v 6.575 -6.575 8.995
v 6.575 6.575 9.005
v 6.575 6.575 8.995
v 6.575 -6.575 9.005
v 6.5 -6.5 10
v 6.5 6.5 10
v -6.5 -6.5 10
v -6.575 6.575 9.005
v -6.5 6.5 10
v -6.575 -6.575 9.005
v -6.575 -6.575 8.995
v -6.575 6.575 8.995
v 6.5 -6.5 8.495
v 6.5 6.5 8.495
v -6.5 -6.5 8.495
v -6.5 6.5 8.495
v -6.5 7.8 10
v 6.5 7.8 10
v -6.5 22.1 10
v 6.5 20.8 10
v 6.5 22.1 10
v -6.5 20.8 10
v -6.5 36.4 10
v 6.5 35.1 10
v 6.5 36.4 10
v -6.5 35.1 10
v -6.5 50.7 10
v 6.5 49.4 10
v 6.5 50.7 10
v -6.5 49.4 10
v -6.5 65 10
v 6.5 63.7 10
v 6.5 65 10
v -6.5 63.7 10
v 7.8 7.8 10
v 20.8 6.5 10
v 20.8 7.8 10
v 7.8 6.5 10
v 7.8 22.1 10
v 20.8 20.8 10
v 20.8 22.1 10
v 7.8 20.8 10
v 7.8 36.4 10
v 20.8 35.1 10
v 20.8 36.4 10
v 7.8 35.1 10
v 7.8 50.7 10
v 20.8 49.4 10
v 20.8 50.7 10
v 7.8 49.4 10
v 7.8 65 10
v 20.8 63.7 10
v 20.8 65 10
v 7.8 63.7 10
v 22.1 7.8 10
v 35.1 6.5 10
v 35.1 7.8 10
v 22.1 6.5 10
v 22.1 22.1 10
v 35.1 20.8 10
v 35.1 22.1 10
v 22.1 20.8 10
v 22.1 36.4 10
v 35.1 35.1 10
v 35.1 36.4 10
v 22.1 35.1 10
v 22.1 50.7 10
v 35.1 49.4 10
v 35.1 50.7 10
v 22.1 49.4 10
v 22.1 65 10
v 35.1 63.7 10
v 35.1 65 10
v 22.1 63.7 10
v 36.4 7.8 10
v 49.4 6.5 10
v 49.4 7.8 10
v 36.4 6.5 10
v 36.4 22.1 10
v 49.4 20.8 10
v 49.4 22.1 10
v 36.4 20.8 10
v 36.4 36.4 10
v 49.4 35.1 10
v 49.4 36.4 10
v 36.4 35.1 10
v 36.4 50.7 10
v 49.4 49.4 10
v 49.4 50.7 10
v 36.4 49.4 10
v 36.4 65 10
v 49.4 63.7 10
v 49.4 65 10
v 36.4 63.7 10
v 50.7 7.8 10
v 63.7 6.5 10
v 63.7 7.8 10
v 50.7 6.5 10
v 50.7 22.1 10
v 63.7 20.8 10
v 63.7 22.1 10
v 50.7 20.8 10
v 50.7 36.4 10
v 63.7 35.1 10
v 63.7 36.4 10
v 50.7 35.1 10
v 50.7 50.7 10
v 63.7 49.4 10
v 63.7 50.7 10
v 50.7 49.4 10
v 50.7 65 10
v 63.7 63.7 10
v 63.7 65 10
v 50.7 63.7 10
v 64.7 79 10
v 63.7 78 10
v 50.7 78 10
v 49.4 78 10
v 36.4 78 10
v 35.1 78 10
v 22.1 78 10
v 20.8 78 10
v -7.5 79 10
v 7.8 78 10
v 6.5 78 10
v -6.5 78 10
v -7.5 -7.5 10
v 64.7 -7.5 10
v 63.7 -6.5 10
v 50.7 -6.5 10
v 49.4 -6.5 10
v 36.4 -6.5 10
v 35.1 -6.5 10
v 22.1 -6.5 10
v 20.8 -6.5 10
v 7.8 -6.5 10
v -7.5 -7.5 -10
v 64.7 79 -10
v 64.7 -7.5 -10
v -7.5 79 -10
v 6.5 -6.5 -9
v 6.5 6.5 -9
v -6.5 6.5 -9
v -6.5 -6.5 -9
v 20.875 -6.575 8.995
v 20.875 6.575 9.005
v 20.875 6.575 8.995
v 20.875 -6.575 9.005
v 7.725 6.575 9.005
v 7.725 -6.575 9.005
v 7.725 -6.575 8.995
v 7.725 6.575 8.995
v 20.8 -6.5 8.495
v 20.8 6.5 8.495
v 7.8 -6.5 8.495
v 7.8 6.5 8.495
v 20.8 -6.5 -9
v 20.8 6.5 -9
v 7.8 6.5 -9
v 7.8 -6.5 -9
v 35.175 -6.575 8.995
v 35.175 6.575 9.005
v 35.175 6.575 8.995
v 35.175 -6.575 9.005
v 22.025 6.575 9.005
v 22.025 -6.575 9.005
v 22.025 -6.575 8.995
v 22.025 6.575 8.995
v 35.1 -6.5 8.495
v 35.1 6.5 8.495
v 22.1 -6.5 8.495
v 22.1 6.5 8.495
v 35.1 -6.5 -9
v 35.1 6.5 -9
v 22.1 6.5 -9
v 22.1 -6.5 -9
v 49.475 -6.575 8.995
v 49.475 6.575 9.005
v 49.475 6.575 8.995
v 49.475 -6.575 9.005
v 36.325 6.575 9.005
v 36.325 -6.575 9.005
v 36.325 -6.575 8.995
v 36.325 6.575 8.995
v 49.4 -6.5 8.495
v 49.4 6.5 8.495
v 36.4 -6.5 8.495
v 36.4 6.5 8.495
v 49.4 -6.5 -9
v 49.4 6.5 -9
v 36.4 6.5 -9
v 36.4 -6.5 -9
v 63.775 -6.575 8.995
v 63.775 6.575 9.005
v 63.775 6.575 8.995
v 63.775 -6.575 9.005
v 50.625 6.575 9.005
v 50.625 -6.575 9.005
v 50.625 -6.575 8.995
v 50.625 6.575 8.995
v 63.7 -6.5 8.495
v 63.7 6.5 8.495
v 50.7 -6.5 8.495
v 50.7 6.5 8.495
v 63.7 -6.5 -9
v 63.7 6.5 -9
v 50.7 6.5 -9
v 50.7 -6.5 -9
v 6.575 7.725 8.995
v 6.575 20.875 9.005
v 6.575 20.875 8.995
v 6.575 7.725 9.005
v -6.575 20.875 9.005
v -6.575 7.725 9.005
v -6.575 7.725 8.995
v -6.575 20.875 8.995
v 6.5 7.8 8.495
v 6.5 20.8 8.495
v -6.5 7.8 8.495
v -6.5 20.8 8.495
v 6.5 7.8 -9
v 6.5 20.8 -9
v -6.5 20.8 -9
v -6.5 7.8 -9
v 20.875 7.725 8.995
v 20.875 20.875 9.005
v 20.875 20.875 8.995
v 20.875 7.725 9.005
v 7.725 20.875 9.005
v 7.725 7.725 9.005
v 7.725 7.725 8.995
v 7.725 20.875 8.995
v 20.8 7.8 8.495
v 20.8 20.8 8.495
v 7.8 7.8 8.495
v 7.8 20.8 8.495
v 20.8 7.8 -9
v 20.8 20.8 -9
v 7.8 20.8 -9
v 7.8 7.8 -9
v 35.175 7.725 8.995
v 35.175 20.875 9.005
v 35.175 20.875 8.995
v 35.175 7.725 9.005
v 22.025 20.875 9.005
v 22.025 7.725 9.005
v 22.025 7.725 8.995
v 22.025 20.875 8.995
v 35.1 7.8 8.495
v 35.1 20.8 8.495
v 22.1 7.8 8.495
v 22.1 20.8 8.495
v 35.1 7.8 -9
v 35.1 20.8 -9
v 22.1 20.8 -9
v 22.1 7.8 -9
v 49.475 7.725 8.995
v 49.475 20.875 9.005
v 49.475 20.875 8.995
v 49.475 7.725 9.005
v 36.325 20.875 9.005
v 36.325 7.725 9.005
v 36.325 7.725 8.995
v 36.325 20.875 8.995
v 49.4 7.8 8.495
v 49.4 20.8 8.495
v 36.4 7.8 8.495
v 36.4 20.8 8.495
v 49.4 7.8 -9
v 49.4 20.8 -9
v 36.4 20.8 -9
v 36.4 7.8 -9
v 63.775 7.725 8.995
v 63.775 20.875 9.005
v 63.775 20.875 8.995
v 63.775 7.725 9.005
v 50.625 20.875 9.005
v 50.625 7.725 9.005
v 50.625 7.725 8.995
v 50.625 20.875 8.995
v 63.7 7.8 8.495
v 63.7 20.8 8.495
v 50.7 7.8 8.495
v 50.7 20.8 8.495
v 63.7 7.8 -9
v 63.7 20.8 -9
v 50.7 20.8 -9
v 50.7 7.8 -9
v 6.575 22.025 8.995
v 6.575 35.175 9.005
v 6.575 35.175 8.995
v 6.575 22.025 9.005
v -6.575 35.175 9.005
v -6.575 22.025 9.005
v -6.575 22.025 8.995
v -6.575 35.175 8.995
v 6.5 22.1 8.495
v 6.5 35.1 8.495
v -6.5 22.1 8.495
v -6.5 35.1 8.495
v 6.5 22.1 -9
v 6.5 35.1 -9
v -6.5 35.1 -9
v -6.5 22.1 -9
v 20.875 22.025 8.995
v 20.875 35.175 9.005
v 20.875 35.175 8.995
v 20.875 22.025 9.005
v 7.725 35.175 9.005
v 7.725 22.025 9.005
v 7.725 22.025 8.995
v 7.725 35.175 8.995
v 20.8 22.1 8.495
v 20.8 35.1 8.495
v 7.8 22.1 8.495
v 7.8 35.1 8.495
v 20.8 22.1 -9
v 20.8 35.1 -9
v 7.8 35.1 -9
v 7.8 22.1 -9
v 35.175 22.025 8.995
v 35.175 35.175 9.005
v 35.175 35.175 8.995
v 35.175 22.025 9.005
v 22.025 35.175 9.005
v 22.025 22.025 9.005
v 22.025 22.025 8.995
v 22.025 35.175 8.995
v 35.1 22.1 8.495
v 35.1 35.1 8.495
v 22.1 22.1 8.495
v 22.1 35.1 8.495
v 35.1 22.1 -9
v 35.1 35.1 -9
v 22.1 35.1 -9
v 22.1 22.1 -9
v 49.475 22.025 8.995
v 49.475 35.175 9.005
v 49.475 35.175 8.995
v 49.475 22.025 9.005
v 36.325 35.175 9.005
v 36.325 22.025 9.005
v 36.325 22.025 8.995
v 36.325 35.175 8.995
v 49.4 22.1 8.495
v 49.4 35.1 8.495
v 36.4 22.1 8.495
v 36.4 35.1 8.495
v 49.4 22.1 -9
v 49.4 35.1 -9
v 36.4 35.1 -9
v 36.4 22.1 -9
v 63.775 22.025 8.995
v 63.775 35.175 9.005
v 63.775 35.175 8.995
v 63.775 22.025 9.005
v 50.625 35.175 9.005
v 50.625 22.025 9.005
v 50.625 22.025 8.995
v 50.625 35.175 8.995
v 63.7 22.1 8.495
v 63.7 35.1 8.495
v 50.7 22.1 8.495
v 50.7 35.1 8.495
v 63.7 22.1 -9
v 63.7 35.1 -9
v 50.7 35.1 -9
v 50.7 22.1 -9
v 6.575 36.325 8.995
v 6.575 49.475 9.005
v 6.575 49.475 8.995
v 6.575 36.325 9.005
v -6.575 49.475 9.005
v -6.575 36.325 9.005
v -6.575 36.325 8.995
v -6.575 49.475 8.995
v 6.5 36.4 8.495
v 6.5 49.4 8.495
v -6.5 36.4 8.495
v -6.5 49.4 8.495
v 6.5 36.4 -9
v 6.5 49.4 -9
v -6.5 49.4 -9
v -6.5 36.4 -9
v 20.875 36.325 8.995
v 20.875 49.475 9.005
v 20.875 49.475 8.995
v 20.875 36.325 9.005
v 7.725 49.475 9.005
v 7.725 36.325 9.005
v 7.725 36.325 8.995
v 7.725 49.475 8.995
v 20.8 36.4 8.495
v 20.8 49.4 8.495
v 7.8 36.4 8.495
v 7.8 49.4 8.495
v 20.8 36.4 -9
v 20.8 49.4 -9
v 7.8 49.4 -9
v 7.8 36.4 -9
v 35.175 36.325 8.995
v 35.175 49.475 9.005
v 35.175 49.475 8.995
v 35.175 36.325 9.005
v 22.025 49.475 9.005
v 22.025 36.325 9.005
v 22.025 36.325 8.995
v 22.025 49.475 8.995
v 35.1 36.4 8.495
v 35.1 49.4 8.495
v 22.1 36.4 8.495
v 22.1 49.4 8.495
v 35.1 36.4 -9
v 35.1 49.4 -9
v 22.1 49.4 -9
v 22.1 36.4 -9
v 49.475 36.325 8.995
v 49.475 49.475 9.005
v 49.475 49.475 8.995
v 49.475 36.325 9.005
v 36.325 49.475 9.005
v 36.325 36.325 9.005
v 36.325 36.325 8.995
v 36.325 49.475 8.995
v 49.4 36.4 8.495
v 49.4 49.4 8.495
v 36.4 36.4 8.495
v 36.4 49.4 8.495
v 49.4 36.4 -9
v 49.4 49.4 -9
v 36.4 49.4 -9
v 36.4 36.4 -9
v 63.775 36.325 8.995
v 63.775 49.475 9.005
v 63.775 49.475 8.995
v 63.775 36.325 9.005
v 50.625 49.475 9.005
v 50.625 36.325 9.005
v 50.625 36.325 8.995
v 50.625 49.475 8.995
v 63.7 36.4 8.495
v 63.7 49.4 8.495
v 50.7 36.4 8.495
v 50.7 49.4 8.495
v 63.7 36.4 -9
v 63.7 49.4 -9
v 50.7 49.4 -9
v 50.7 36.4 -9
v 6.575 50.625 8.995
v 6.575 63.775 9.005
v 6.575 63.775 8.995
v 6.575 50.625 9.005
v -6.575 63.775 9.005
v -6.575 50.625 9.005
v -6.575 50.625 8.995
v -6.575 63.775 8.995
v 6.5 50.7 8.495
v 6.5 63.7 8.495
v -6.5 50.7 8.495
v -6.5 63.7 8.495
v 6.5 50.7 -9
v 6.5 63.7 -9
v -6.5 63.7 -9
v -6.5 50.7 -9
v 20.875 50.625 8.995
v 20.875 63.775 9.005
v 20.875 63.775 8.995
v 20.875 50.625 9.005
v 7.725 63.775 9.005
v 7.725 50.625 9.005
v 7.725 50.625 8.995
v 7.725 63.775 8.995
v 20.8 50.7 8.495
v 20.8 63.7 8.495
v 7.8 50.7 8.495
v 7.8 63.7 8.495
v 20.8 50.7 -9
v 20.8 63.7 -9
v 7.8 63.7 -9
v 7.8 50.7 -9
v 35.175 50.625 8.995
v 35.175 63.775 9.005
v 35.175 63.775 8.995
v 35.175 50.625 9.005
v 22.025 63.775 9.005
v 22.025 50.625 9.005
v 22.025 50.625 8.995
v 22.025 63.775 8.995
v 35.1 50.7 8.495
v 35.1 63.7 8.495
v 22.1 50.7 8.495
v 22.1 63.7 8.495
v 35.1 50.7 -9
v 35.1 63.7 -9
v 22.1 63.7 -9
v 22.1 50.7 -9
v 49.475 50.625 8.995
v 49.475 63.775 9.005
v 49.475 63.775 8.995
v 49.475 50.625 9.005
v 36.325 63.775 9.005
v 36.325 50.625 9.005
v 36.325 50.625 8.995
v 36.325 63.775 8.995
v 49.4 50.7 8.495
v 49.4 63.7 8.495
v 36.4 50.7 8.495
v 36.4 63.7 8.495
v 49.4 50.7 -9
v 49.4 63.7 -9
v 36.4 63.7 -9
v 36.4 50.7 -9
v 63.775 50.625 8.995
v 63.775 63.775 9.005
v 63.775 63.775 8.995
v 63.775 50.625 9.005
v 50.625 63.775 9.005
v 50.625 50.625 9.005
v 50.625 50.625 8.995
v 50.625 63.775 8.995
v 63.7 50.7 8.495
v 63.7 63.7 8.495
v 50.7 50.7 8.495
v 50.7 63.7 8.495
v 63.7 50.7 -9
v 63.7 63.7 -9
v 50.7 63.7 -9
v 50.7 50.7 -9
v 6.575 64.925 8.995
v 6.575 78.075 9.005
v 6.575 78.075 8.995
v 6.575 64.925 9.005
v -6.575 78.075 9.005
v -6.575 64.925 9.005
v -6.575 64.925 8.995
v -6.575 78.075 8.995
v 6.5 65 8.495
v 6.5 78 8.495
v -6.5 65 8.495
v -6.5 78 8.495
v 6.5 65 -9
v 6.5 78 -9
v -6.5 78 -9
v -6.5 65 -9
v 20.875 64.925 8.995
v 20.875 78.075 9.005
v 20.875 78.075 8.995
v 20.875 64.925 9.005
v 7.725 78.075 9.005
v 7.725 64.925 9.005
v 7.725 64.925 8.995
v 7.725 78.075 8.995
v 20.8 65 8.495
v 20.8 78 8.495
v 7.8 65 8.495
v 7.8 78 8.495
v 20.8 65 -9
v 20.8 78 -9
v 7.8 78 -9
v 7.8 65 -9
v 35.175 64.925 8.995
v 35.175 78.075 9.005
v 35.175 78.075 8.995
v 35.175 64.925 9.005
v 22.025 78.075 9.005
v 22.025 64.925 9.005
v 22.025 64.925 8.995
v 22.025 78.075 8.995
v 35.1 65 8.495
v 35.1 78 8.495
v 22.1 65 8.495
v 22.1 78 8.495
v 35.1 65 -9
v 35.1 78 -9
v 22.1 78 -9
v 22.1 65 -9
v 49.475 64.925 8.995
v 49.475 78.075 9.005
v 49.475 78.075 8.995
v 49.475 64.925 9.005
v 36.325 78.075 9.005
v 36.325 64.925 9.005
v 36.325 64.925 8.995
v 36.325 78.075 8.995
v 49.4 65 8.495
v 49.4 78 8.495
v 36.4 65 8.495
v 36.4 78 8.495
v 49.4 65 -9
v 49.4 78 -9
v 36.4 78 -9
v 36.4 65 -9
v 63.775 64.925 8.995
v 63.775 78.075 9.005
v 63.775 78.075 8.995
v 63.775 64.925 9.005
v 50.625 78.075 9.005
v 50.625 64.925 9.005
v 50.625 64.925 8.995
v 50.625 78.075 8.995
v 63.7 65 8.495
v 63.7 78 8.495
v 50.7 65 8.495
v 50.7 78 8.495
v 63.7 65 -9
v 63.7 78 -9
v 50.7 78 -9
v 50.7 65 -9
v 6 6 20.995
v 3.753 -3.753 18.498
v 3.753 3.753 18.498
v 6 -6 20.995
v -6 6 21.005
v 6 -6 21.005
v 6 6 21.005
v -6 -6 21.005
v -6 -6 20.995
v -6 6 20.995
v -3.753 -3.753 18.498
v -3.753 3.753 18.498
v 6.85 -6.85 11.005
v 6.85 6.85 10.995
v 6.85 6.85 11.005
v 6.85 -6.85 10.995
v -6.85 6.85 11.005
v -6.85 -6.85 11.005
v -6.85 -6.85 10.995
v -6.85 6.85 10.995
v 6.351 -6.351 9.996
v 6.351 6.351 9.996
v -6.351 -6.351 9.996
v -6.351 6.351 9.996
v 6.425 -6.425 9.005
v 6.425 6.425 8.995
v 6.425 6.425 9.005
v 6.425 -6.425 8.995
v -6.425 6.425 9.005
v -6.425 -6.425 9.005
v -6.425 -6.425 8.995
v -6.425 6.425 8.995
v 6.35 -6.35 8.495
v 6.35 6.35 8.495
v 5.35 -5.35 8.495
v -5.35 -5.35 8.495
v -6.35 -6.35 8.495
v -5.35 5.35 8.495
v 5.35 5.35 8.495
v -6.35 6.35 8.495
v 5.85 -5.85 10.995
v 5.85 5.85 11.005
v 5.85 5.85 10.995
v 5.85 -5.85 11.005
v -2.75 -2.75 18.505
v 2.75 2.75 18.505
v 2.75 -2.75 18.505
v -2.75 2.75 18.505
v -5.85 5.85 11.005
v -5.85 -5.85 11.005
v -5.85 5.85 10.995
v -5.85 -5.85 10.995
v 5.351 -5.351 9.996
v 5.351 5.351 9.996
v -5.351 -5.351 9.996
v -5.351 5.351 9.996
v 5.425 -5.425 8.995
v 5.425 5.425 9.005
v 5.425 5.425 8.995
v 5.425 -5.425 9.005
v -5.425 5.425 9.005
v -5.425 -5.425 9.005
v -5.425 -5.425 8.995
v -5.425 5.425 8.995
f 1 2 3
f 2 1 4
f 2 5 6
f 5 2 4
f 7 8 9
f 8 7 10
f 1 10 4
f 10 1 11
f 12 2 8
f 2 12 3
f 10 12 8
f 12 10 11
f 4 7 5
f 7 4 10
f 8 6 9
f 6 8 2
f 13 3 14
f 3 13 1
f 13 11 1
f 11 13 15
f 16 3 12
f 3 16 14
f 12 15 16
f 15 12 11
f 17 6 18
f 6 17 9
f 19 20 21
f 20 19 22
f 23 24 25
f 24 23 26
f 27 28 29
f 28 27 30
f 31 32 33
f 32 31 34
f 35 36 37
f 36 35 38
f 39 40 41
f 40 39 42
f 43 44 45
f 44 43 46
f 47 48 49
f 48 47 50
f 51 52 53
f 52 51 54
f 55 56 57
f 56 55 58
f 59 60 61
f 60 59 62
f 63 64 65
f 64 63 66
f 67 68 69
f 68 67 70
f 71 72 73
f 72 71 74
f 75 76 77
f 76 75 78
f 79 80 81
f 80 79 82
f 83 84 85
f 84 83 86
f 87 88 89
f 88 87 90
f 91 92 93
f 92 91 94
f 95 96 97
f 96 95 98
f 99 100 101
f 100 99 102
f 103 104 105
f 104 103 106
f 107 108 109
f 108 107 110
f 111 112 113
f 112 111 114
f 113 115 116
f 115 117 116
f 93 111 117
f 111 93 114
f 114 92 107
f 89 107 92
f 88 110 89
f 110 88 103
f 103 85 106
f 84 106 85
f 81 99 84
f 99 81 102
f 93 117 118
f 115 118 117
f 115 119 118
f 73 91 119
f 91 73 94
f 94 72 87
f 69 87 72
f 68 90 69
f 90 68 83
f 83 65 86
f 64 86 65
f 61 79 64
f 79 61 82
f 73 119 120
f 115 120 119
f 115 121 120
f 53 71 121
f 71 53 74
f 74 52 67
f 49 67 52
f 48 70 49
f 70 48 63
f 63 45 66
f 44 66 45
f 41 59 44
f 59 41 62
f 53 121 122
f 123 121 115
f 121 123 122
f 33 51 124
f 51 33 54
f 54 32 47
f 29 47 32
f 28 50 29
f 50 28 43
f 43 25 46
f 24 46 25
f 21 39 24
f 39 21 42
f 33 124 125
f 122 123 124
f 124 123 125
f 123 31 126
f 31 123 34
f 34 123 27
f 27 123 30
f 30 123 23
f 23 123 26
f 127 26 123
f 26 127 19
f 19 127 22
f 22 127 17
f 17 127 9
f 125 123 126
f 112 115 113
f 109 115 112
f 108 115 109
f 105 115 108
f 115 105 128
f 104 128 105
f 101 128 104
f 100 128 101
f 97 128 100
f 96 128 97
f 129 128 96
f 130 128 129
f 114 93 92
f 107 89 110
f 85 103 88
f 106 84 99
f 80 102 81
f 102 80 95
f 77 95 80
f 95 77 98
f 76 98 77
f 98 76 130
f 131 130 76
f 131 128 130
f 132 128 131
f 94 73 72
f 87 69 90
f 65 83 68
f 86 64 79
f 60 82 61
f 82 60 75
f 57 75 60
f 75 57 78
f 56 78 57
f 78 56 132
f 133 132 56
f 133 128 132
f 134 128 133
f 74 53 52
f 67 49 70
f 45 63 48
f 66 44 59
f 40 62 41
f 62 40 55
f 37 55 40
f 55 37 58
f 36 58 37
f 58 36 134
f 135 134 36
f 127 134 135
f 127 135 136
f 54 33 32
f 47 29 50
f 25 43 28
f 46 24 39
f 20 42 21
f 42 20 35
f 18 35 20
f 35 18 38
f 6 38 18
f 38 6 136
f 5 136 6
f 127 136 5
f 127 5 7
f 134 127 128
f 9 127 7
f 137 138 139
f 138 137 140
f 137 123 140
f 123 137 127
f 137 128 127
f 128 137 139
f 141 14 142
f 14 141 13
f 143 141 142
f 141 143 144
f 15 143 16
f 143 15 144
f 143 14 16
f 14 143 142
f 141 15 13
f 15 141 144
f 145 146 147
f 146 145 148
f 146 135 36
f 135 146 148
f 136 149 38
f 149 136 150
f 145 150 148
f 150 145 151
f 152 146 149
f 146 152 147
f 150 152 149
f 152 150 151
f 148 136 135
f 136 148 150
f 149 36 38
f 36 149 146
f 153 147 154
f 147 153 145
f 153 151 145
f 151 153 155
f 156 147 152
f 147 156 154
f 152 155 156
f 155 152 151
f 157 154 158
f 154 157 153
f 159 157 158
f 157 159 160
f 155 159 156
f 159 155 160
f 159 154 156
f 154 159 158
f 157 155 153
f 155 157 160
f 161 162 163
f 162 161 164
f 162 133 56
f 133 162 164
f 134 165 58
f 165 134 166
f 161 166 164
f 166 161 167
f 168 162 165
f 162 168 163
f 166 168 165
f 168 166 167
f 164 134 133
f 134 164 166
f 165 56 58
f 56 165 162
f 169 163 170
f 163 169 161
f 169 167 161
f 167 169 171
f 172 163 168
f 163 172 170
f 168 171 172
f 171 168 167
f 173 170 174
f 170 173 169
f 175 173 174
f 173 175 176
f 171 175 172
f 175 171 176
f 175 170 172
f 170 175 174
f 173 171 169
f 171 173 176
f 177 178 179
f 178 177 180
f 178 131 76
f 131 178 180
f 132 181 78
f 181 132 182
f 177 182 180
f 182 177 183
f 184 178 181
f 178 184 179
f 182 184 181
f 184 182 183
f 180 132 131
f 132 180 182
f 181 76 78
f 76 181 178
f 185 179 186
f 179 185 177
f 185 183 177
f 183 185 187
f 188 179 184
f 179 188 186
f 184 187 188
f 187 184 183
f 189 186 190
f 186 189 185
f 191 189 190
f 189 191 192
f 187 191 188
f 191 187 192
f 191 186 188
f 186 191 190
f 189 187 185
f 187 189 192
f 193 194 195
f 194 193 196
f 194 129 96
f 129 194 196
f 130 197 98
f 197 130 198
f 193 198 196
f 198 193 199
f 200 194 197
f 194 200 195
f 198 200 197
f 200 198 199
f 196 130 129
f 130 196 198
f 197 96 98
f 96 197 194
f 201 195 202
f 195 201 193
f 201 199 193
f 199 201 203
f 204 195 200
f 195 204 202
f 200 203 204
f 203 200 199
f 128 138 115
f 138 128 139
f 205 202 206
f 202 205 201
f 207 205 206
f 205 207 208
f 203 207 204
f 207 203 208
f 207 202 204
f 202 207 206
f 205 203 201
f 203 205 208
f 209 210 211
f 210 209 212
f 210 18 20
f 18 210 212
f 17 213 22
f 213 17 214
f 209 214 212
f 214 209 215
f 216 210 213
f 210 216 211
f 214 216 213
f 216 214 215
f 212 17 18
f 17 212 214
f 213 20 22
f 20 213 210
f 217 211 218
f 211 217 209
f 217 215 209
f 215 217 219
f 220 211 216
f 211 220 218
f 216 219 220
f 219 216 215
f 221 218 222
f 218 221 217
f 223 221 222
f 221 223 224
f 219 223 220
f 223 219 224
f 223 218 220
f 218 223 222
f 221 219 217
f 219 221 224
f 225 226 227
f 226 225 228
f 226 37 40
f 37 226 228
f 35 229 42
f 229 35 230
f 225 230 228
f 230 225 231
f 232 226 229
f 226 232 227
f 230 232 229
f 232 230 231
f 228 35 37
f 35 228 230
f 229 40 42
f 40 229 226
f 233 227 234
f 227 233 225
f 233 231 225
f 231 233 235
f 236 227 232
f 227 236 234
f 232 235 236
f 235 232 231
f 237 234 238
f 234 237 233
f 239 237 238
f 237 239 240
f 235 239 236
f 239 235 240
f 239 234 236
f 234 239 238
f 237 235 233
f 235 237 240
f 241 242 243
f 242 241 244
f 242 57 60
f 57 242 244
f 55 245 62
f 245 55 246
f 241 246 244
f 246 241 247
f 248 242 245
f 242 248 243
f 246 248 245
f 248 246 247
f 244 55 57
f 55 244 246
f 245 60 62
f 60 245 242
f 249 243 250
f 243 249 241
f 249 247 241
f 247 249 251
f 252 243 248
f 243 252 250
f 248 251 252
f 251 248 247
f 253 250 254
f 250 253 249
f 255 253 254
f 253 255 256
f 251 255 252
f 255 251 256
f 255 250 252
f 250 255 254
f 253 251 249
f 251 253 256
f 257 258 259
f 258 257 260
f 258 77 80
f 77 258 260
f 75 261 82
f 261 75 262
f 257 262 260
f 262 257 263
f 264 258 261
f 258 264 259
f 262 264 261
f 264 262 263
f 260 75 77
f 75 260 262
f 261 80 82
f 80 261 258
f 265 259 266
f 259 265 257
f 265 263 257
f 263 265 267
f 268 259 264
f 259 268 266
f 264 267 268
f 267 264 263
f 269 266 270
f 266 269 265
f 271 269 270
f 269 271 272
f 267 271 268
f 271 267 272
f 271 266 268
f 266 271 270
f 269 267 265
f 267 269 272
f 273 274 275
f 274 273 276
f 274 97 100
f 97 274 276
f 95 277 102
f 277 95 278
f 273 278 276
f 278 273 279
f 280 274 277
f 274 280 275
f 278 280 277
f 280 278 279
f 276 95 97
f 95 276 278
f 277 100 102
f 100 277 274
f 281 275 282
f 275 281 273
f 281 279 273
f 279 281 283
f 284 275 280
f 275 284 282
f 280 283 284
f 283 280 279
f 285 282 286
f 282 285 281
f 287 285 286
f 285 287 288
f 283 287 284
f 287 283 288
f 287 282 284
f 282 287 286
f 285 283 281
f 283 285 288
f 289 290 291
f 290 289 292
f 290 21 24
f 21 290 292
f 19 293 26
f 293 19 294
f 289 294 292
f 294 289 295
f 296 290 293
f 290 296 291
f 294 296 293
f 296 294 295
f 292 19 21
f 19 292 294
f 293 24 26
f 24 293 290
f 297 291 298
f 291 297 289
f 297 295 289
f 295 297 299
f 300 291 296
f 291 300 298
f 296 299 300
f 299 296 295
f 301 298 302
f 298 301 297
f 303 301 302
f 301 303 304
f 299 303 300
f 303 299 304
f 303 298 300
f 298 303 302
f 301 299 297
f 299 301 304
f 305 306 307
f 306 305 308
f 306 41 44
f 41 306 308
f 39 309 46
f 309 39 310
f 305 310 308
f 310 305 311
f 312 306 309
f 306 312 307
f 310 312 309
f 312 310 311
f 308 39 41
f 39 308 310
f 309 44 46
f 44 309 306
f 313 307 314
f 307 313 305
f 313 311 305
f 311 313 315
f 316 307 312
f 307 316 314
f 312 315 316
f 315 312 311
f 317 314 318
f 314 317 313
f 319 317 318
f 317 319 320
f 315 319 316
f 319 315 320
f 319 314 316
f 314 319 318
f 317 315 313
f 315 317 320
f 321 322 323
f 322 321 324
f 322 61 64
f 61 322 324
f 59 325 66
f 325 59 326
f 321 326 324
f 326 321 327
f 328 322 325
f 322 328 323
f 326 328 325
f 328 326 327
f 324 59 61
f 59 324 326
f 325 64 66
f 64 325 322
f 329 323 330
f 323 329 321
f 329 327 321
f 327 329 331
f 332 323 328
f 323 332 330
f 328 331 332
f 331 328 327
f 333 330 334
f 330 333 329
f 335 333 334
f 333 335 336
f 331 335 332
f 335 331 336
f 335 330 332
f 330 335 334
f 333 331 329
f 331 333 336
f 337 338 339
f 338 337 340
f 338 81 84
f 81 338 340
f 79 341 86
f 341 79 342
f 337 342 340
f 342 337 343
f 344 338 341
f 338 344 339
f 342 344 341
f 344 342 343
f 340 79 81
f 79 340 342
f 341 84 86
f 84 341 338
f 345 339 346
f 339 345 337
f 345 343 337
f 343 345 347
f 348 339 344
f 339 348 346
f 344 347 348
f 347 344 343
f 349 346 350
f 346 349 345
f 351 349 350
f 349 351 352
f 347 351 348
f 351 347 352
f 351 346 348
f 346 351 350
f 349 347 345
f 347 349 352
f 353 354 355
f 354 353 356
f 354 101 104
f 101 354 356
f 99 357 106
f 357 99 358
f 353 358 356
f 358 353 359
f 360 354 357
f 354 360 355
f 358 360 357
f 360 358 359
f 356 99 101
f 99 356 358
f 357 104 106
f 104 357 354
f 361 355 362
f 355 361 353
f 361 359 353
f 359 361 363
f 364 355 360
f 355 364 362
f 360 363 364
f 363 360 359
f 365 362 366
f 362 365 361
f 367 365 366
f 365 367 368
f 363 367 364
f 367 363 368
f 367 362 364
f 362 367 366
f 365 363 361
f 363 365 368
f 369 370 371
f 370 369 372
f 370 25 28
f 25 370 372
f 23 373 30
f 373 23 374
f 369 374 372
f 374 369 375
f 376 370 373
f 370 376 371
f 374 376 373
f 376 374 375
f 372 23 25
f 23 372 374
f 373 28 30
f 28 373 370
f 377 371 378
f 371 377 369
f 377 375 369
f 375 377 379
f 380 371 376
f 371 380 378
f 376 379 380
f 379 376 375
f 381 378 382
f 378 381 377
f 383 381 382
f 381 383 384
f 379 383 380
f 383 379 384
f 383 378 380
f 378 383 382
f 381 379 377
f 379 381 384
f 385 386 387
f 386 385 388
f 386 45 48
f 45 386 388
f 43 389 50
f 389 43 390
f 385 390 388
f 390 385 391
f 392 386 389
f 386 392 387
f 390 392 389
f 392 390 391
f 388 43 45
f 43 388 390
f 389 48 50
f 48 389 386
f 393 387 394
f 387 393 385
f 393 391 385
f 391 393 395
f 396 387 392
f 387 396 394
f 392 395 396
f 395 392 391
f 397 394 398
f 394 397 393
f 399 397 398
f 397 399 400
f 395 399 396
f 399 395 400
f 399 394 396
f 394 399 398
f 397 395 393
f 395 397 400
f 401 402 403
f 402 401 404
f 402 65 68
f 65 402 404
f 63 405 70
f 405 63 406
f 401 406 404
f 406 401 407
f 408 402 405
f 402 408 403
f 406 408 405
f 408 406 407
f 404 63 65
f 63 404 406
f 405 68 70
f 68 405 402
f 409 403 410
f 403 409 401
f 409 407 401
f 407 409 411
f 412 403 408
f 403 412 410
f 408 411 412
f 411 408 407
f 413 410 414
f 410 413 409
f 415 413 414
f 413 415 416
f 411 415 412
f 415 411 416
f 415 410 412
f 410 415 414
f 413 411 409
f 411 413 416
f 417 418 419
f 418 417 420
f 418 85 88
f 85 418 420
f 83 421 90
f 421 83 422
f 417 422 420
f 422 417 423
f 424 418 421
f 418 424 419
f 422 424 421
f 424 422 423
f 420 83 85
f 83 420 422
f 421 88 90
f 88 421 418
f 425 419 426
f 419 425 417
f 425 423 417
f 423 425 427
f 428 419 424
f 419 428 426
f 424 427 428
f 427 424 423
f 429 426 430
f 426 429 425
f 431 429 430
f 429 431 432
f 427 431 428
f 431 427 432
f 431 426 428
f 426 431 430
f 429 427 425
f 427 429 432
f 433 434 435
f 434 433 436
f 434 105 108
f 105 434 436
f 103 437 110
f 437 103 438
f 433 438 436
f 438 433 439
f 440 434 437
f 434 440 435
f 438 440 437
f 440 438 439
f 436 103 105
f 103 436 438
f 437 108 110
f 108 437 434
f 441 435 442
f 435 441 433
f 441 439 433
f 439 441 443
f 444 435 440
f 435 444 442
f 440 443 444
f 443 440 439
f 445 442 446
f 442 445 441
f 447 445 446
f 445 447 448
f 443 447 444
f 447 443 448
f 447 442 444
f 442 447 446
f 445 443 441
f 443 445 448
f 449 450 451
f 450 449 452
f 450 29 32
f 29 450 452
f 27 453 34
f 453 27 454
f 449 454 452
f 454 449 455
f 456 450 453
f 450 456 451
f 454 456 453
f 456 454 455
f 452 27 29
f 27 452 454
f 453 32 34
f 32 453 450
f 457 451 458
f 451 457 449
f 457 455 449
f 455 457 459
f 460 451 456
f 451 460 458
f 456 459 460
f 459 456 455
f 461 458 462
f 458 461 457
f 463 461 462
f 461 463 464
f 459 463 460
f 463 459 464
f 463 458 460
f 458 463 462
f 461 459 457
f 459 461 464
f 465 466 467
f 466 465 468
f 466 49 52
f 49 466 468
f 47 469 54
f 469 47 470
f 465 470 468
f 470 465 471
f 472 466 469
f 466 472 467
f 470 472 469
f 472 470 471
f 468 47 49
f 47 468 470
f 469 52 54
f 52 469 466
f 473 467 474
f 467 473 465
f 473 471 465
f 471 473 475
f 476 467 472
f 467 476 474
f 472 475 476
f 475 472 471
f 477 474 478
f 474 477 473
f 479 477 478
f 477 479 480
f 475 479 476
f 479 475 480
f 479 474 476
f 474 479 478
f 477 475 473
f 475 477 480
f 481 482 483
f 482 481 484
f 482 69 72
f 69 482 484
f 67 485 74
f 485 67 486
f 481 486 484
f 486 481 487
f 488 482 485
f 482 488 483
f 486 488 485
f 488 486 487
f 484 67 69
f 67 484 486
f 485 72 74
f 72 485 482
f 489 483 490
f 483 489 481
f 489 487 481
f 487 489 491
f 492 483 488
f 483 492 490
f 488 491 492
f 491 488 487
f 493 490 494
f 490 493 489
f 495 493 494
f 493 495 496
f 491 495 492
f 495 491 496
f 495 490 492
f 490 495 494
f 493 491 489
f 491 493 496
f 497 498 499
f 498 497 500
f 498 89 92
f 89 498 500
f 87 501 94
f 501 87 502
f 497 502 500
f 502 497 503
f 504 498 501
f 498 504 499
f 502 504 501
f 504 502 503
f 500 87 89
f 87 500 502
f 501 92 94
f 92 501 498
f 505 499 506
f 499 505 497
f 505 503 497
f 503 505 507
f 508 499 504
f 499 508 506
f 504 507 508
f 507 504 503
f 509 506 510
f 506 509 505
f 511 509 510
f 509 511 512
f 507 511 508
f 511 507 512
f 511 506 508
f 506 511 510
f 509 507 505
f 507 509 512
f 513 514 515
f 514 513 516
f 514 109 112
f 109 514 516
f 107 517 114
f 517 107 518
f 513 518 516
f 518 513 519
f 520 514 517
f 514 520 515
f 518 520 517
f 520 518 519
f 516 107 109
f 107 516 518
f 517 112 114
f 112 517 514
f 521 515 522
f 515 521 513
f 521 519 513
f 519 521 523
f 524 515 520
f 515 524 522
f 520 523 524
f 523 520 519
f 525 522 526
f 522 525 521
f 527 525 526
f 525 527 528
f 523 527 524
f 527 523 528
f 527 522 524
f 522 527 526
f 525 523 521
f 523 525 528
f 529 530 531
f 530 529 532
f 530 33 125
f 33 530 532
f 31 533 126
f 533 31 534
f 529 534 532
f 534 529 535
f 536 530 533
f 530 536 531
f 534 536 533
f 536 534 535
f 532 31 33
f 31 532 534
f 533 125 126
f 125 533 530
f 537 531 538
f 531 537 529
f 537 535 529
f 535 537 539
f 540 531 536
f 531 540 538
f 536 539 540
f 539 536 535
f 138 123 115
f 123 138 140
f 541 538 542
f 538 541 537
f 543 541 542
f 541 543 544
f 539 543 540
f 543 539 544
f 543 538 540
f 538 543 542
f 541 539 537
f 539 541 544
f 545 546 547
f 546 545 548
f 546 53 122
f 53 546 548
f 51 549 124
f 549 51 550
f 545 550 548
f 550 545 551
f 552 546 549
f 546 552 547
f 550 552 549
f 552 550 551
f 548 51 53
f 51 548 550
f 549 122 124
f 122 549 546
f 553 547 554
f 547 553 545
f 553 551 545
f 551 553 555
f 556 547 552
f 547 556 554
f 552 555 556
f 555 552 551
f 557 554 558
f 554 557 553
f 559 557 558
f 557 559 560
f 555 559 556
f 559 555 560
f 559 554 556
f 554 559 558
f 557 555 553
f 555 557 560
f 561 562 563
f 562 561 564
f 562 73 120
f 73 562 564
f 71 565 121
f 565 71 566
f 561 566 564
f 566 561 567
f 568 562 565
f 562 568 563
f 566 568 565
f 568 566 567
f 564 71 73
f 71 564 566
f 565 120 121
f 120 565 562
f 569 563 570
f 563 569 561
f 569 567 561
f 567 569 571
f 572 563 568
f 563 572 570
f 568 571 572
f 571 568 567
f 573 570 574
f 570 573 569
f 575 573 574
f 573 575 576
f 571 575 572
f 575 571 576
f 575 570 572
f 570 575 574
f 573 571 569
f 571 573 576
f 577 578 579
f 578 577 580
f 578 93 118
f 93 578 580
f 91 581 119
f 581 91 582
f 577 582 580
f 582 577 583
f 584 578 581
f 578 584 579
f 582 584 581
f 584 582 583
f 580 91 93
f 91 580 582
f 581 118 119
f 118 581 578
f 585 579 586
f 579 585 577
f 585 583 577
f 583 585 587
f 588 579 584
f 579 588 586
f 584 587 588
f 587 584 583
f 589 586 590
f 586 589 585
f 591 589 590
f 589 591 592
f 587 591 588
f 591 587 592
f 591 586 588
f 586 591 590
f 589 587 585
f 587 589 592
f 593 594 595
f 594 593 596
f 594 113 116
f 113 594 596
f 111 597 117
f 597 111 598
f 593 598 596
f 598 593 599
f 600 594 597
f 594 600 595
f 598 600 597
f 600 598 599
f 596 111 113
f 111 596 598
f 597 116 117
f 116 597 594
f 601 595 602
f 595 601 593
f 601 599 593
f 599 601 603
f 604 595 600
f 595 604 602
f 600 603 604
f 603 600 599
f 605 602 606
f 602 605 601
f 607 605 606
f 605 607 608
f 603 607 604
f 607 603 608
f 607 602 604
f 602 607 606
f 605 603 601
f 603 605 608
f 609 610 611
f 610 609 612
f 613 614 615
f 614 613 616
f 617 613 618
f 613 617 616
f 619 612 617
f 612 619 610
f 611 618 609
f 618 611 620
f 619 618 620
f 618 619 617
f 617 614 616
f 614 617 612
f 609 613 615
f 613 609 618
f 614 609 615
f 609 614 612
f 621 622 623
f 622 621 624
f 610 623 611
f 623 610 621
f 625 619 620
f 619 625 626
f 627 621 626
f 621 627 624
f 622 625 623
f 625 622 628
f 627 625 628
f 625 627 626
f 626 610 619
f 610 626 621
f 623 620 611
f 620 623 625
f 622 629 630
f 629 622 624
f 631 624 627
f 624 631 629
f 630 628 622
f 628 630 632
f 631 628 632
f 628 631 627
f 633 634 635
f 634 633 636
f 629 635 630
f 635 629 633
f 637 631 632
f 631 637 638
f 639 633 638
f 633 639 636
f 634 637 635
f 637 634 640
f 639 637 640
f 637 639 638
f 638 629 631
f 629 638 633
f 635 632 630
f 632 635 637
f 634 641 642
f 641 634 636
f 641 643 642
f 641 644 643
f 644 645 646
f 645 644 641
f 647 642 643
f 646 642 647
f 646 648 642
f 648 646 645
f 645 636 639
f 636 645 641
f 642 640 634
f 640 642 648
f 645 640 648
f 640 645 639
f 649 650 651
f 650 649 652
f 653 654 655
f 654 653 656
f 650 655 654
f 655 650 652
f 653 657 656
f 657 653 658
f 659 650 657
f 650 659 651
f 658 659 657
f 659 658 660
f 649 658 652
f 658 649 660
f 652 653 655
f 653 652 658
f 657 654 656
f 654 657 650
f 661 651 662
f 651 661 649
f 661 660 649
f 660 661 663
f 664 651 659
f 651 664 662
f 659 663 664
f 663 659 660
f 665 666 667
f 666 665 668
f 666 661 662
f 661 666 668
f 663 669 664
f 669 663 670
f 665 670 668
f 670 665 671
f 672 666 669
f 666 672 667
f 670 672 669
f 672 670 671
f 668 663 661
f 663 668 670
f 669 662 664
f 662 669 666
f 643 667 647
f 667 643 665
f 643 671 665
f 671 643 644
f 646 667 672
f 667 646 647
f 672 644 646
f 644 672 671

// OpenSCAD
bwidth=15;
bdepth=15;
bheight=20;
wallth=1;
prdelta=0.3;

module box() {
    difference() {
        translate([0,0,0])
            cube([bwidth,bdepth,bheight], center=true);
        translate([0,0,wallth])
            cube([bwidth-wallth*2,bdepth-wallth*2,bheight], center=true);
        translate([0,0,bheight/2-2]) {
            hull() {
                translate([0,0,2])
                    cube([bwidth-wallth*2,bdepth-wallth*2,0.01], center=true);
                translate([0,0,1])
                    cube([bwidth-wallth*2+prdelta/2,bdepth-wallth*2+prdelta/2,0.01], center=true);
            }
            hull() {
                translate([0,0,1])
                    cube([bwidth-wallth*2+prdelta/2,bdepth-wallth*2+prdelta/2,0.01], center=true);
                translate([0,0,0.5])
                    cube([bwidth-wallth*2,bdepth-wallth*2,0.01], center=true);
            }
        }
    }
}

module cap() {
    translate([0,0,8.5]) {
        difference() {
            union() {
                hull() {
                    translate([0,0,5+(bwidth+bdepth)/4])
                        cube([bwidth*0.8,bdepth*0.8,0.01], center=true);
                    translate([0,0,2.5+(bwidth+bdepth)/4])
                        cube([bwidth/2,bdepth/2,0.01], center=true);
                }
                hull() {
                    translate([0,0,2.5+(bwidth+bdepth)/4])
                        cube([bwidth/2,bdepth/2,0.01], center=true);
                    translate([0,0,2.5])
                        cube([bwidth-wallth-prdelta,bdepth-wallth-prdelta,0.01], center=true);
                }
                hull() {
                    translate([0,0,2.5])
                        cube([bwidth-wallth-prdelta,bdepth-wallth-prdelta,0.01], center=true);
                    translate([0,0,1.5])
                        cube([bwidth-wallth*2-prdelta,bdepth-wallth*2-prdelta,0.01], center=true);
                }
                hull() {
                    translate([0,0,1.5])
                        cube([bwidth-wallth*2-prdelta,bdepth-wallth*2-prdelta,0.01], center=true);
                    translate([0,0,0.5])
                        cube([bwidth-wallth*2-prdelta/2,bdepth-wallth*2-prdelta/2,0.01], center=true);
                }
                hull() {
                    translate([0,0,0.5])
                        cube([bwidth-wallth*2-prdelta/2,bdepth-wallth*2-prdelta/2,0.01], center=true);
                    translate([0,0,0])
                        cube([bwidth-wallth*2-prdelta,bdepth-wallth*2-prdelta,0.01], center=true);
                }
            }
            
            union() {
                hull() {
                    translate([0,0,2.5+(bwidth+bdepth)/4])
                        cube([bwidth/2-wallth*2,bdepth/2-wallth*2,0.01], center=true);
                    translate([0,0,2.5])
                        cube([bwidth-wallth*3-prdelta,bdepth-wallth*3-prdelta,0.01], center=true);
                }
                hull() {
                    translate([0,0,2.5])
                        cube([bwidth-wallth*3-prdelta,bdepth-wallth*3-prdelta,0.01], center=true);
                    translate([0,0,1.5])
                        cube([bwidth-wallth*4-prdelta,bdepth-wallth*4-prdelta,0.01], center=true);
                }
                hull() {
                    translate([0,0,1.5])
                        cube([bwidth-wallth*4-prdelta,bdepth-wallth*4-prdelta,0.01], center=true);
                    translate([0,0,0.5])
                        cube([bwidth-wallth*4-prdelta/2,bdepth-wallth*4-prdelta/2,0.01], center=true);
                }
                hull() {
                    translate([0,0,0.5])
                        cube([bwidth-wallth*4-prdelta/2,bdepth-wallth*4-prdelta/2,0.01], center=true);
                    translate([0,0,0])
                        cube([bwidth-wallth*4-prdelta,bdepth-wallth*4-prdelta,0.01], center=true);
                }
                
            }
        }
    }
}

for (iy = [0:5]) {
    for (ix = [0:4]) {
        translate([(bwidth-wallth+prdelta)*ix,(bdepth-wallth+prdelta)*iy,0])
            box();
    }
}

cap();
